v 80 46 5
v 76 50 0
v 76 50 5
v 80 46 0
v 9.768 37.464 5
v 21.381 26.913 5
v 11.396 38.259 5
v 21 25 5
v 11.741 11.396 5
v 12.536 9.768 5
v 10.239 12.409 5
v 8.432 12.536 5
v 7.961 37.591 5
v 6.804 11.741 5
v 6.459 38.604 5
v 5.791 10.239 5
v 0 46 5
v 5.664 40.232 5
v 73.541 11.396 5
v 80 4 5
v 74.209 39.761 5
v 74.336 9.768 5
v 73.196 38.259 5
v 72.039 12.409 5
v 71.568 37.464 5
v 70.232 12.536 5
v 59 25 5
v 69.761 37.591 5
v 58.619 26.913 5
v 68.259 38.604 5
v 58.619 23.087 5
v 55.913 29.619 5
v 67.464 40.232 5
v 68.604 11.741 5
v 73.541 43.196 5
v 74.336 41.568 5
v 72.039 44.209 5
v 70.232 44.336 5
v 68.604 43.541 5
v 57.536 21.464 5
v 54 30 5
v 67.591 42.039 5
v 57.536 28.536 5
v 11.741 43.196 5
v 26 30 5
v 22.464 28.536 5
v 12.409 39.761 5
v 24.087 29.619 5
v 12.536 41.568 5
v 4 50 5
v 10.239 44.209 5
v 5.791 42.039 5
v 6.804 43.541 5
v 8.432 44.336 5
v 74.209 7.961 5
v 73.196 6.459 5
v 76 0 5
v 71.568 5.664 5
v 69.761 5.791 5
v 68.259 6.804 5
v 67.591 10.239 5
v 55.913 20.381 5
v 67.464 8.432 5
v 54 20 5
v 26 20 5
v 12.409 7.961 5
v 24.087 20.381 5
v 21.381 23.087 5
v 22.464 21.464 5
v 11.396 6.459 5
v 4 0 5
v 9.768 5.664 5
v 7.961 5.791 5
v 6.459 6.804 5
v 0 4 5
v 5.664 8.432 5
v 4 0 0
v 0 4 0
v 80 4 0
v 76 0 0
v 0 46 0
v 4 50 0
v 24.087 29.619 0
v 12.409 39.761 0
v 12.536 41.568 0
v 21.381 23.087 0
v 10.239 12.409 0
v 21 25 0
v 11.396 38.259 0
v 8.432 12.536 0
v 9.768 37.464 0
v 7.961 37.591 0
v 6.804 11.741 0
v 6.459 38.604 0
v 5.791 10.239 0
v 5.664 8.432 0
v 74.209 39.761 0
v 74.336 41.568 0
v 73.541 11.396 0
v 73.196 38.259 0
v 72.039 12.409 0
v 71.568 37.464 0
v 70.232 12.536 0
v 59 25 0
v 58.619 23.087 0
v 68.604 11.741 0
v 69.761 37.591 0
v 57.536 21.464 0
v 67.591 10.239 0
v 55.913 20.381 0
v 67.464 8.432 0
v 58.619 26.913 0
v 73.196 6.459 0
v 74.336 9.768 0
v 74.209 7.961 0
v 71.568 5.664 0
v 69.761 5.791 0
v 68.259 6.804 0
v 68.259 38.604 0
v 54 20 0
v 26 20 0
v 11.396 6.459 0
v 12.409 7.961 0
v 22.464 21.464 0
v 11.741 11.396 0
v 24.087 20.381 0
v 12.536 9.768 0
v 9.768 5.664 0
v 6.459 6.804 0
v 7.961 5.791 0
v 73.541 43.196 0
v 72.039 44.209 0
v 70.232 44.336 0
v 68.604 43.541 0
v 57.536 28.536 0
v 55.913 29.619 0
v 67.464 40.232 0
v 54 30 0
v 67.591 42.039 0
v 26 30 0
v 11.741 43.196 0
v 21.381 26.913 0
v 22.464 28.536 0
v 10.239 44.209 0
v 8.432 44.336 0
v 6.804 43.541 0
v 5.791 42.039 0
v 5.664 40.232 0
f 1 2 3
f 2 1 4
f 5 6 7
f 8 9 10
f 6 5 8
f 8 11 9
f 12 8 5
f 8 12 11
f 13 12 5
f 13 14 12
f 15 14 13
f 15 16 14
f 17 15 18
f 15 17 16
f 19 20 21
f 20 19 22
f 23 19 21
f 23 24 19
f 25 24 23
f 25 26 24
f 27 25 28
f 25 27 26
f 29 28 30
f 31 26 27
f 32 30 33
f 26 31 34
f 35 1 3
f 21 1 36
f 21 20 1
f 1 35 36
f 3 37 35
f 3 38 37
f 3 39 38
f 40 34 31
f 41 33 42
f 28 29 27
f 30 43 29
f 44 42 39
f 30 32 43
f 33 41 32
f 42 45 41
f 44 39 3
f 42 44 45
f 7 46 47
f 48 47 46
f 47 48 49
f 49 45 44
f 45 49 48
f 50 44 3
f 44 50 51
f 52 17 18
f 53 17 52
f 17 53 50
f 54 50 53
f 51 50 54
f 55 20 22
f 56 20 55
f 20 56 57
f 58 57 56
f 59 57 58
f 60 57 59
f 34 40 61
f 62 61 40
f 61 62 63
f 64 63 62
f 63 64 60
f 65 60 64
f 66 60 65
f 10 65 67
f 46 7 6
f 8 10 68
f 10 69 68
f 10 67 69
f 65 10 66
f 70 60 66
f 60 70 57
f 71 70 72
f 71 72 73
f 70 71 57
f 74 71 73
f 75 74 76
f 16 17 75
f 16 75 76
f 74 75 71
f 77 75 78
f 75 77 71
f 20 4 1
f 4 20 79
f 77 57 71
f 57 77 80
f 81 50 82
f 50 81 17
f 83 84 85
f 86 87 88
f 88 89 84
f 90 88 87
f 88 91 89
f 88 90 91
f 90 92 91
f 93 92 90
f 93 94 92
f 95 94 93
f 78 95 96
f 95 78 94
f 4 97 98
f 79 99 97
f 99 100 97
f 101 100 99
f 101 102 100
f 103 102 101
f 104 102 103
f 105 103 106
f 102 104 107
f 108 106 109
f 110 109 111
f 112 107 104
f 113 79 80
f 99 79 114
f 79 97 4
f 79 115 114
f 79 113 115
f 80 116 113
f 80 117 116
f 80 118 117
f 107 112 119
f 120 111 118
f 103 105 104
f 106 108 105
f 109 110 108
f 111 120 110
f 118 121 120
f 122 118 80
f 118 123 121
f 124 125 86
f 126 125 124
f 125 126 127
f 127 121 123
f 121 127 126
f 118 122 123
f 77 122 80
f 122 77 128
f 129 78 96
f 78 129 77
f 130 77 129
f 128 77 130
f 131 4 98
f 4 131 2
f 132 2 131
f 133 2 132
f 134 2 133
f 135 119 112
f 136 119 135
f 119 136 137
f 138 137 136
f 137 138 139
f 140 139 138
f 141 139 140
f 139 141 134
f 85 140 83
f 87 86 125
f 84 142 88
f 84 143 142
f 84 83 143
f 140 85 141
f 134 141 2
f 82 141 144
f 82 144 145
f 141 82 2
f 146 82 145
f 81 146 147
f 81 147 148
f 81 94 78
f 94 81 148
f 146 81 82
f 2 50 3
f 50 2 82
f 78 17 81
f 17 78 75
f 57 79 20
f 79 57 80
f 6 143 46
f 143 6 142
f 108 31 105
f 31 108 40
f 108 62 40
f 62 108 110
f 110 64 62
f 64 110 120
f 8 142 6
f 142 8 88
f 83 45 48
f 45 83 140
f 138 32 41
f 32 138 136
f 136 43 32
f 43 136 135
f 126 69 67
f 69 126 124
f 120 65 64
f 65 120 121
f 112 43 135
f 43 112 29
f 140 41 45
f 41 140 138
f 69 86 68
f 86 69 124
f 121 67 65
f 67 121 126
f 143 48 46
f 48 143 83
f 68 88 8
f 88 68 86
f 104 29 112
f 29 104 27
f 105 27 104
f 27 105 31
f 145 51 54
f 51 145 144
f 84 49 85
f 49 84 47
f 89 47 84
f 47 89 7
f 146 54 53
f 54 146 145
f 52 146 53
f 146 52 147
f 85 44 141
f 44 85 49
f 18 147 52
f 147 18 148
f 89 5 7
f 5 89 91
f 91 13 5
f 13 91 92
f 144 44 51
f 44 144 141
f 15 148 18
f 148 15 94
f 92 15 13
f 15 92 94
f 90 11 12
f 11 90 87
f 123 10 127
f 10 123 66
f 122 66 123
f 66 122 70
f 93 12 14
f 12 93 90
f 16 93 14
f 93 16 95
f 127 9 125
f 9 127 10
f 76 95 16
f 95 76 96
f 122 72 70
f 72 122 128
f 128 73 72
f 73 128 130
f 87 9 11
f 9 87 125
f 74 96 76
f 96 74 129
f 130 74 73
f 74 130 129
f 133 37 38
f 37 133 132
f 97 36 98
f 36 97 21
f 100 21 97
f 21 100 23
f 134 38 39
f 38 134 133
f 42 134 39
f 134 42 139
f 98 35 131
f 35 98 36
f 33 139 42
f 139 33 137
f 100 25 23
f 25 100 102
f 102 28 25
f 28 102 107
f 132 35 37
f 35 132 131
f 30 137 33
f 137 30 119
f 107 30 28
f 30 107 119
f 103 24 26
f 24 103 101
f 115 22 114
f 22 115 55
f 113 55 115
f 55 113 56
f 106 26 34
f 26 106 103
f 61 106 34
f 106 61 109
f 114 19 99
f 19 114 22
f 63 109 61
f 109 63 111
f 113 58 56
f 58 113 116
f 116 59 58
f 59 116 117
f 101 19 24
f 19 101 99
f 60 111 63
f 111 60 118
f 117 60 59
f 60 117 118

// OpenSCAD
$fn = 32;

// ----------------------------------------------------------------------
// Bracket plate: slot plate 80 x 50
// ----------------------------------------------------------------------

// --- parameters (mm) ---
hole_r = 3.5;             // bolt hole radius
plate_t = 5;              // plate thickness, Z (extrusion height)
plate_l = 80;             // plate length
plate_w = 50;             // plate width
slot_l = 28;              // slot straight length
slot_r = 5;               // slot end radius
fit_tol = 0.1;            // declared fit tolerance (prompt contract)
free_tol = 0.3;           // declared free tolerance (prompt contract)

slot_len = slot_l + 2 * slot_r;
slot_w = 2 * slot_r;
hole_d2 = 2 * hole_r;

profile = [[4, 0], [76, 0], [80, 4], [80, 46], [76, 50], [4, 50], [0, 46], [0, 4]];  // primary outline, 8 points, counter clockwise
void_1 = [[54, 20], [55.913, 20.381], [57.536, 21.464], [58.619, 23.087], [59, 25], [58.619, 26.913], [57.536, 28.536], [55.913, 29.619], [54, 30], [26, 30], [24.087, 29.619], [22.464, 28.536], [21.381, 26.913], [21, 25], [21.381, 23.087], [22.464, 21.464], [24.087, 20.381], [26, 20]];  // grip slot, 18 points
void_2 = [[12.536, 41.568], [11.741, 43.196], [10.239, 44.209], [8.432, 44.336], [6.804, 43.541], [5.791, 42.039], [5.664, 40.232], [6.459, 38.604], [7.961, 37.591], [9.768, 37.464], [11.396, 38.259], [12.409, 39.761]];  // corner hole, 12 points
void_3 = [[12.536, 9.768], [11.741, 11.396], [10.239, 12.409], [8.432, 12.536], [6.804, 11.741], [5.791, 10.239], [5.664, 8.432], [6.459, 6.804], [7.961, 5.791], [9.768, 5.664], [11.396, 6.459], [12.409, 7.961]];  // corner hole, 12 points
void_4 = [[74.336, 41.568], [73.541, 43.196], [72.039, 44.209], [70.232, 44.336], [68.604, 43.541], [67.591, 42.039], [67.464, 40.232], [68.259, 38.604], [69.761, 37.591], [71.568, 37.464], [73.196, 38.259], [74.209, 39.761]];  // corner hole, 12 points
void_5 = [[74.336, 9.768], [73.541, 11.396], [72.039, 12.409], [70.232, 12.536], [68.604, 11.741], [67.591, 10.239], [67.464, 8.432], [68.259, 6.804], [69.761, 5.791], [71.568, 5.664], [73.196, 6.459], [74.209, 7.961]];  // corner hole, 12 points

// --- the one profile operation ---
difference() {
  linear_extrude(height = plate_t) polygon(points = profile);
  translate([0, 0, -1])
    linear_extrude(height = plate_t + 2) polygon(points = void_1);
  translate([0, 0, -1])
    linear_extrude(height = plate_t + 2) polygon(points = void_2);
  translate([0, 0, -1])
    linear_extrude(height = plate_t + 2) polygon(points = void_3);
  translate([0, 0, -1])
    linear_extrude(height = plate_t + 2) polygon(points = void_4);
  translate([0, 0, -1])
    linear_extrude(height = plate_t + 2) polygon(points = void_5);
}
